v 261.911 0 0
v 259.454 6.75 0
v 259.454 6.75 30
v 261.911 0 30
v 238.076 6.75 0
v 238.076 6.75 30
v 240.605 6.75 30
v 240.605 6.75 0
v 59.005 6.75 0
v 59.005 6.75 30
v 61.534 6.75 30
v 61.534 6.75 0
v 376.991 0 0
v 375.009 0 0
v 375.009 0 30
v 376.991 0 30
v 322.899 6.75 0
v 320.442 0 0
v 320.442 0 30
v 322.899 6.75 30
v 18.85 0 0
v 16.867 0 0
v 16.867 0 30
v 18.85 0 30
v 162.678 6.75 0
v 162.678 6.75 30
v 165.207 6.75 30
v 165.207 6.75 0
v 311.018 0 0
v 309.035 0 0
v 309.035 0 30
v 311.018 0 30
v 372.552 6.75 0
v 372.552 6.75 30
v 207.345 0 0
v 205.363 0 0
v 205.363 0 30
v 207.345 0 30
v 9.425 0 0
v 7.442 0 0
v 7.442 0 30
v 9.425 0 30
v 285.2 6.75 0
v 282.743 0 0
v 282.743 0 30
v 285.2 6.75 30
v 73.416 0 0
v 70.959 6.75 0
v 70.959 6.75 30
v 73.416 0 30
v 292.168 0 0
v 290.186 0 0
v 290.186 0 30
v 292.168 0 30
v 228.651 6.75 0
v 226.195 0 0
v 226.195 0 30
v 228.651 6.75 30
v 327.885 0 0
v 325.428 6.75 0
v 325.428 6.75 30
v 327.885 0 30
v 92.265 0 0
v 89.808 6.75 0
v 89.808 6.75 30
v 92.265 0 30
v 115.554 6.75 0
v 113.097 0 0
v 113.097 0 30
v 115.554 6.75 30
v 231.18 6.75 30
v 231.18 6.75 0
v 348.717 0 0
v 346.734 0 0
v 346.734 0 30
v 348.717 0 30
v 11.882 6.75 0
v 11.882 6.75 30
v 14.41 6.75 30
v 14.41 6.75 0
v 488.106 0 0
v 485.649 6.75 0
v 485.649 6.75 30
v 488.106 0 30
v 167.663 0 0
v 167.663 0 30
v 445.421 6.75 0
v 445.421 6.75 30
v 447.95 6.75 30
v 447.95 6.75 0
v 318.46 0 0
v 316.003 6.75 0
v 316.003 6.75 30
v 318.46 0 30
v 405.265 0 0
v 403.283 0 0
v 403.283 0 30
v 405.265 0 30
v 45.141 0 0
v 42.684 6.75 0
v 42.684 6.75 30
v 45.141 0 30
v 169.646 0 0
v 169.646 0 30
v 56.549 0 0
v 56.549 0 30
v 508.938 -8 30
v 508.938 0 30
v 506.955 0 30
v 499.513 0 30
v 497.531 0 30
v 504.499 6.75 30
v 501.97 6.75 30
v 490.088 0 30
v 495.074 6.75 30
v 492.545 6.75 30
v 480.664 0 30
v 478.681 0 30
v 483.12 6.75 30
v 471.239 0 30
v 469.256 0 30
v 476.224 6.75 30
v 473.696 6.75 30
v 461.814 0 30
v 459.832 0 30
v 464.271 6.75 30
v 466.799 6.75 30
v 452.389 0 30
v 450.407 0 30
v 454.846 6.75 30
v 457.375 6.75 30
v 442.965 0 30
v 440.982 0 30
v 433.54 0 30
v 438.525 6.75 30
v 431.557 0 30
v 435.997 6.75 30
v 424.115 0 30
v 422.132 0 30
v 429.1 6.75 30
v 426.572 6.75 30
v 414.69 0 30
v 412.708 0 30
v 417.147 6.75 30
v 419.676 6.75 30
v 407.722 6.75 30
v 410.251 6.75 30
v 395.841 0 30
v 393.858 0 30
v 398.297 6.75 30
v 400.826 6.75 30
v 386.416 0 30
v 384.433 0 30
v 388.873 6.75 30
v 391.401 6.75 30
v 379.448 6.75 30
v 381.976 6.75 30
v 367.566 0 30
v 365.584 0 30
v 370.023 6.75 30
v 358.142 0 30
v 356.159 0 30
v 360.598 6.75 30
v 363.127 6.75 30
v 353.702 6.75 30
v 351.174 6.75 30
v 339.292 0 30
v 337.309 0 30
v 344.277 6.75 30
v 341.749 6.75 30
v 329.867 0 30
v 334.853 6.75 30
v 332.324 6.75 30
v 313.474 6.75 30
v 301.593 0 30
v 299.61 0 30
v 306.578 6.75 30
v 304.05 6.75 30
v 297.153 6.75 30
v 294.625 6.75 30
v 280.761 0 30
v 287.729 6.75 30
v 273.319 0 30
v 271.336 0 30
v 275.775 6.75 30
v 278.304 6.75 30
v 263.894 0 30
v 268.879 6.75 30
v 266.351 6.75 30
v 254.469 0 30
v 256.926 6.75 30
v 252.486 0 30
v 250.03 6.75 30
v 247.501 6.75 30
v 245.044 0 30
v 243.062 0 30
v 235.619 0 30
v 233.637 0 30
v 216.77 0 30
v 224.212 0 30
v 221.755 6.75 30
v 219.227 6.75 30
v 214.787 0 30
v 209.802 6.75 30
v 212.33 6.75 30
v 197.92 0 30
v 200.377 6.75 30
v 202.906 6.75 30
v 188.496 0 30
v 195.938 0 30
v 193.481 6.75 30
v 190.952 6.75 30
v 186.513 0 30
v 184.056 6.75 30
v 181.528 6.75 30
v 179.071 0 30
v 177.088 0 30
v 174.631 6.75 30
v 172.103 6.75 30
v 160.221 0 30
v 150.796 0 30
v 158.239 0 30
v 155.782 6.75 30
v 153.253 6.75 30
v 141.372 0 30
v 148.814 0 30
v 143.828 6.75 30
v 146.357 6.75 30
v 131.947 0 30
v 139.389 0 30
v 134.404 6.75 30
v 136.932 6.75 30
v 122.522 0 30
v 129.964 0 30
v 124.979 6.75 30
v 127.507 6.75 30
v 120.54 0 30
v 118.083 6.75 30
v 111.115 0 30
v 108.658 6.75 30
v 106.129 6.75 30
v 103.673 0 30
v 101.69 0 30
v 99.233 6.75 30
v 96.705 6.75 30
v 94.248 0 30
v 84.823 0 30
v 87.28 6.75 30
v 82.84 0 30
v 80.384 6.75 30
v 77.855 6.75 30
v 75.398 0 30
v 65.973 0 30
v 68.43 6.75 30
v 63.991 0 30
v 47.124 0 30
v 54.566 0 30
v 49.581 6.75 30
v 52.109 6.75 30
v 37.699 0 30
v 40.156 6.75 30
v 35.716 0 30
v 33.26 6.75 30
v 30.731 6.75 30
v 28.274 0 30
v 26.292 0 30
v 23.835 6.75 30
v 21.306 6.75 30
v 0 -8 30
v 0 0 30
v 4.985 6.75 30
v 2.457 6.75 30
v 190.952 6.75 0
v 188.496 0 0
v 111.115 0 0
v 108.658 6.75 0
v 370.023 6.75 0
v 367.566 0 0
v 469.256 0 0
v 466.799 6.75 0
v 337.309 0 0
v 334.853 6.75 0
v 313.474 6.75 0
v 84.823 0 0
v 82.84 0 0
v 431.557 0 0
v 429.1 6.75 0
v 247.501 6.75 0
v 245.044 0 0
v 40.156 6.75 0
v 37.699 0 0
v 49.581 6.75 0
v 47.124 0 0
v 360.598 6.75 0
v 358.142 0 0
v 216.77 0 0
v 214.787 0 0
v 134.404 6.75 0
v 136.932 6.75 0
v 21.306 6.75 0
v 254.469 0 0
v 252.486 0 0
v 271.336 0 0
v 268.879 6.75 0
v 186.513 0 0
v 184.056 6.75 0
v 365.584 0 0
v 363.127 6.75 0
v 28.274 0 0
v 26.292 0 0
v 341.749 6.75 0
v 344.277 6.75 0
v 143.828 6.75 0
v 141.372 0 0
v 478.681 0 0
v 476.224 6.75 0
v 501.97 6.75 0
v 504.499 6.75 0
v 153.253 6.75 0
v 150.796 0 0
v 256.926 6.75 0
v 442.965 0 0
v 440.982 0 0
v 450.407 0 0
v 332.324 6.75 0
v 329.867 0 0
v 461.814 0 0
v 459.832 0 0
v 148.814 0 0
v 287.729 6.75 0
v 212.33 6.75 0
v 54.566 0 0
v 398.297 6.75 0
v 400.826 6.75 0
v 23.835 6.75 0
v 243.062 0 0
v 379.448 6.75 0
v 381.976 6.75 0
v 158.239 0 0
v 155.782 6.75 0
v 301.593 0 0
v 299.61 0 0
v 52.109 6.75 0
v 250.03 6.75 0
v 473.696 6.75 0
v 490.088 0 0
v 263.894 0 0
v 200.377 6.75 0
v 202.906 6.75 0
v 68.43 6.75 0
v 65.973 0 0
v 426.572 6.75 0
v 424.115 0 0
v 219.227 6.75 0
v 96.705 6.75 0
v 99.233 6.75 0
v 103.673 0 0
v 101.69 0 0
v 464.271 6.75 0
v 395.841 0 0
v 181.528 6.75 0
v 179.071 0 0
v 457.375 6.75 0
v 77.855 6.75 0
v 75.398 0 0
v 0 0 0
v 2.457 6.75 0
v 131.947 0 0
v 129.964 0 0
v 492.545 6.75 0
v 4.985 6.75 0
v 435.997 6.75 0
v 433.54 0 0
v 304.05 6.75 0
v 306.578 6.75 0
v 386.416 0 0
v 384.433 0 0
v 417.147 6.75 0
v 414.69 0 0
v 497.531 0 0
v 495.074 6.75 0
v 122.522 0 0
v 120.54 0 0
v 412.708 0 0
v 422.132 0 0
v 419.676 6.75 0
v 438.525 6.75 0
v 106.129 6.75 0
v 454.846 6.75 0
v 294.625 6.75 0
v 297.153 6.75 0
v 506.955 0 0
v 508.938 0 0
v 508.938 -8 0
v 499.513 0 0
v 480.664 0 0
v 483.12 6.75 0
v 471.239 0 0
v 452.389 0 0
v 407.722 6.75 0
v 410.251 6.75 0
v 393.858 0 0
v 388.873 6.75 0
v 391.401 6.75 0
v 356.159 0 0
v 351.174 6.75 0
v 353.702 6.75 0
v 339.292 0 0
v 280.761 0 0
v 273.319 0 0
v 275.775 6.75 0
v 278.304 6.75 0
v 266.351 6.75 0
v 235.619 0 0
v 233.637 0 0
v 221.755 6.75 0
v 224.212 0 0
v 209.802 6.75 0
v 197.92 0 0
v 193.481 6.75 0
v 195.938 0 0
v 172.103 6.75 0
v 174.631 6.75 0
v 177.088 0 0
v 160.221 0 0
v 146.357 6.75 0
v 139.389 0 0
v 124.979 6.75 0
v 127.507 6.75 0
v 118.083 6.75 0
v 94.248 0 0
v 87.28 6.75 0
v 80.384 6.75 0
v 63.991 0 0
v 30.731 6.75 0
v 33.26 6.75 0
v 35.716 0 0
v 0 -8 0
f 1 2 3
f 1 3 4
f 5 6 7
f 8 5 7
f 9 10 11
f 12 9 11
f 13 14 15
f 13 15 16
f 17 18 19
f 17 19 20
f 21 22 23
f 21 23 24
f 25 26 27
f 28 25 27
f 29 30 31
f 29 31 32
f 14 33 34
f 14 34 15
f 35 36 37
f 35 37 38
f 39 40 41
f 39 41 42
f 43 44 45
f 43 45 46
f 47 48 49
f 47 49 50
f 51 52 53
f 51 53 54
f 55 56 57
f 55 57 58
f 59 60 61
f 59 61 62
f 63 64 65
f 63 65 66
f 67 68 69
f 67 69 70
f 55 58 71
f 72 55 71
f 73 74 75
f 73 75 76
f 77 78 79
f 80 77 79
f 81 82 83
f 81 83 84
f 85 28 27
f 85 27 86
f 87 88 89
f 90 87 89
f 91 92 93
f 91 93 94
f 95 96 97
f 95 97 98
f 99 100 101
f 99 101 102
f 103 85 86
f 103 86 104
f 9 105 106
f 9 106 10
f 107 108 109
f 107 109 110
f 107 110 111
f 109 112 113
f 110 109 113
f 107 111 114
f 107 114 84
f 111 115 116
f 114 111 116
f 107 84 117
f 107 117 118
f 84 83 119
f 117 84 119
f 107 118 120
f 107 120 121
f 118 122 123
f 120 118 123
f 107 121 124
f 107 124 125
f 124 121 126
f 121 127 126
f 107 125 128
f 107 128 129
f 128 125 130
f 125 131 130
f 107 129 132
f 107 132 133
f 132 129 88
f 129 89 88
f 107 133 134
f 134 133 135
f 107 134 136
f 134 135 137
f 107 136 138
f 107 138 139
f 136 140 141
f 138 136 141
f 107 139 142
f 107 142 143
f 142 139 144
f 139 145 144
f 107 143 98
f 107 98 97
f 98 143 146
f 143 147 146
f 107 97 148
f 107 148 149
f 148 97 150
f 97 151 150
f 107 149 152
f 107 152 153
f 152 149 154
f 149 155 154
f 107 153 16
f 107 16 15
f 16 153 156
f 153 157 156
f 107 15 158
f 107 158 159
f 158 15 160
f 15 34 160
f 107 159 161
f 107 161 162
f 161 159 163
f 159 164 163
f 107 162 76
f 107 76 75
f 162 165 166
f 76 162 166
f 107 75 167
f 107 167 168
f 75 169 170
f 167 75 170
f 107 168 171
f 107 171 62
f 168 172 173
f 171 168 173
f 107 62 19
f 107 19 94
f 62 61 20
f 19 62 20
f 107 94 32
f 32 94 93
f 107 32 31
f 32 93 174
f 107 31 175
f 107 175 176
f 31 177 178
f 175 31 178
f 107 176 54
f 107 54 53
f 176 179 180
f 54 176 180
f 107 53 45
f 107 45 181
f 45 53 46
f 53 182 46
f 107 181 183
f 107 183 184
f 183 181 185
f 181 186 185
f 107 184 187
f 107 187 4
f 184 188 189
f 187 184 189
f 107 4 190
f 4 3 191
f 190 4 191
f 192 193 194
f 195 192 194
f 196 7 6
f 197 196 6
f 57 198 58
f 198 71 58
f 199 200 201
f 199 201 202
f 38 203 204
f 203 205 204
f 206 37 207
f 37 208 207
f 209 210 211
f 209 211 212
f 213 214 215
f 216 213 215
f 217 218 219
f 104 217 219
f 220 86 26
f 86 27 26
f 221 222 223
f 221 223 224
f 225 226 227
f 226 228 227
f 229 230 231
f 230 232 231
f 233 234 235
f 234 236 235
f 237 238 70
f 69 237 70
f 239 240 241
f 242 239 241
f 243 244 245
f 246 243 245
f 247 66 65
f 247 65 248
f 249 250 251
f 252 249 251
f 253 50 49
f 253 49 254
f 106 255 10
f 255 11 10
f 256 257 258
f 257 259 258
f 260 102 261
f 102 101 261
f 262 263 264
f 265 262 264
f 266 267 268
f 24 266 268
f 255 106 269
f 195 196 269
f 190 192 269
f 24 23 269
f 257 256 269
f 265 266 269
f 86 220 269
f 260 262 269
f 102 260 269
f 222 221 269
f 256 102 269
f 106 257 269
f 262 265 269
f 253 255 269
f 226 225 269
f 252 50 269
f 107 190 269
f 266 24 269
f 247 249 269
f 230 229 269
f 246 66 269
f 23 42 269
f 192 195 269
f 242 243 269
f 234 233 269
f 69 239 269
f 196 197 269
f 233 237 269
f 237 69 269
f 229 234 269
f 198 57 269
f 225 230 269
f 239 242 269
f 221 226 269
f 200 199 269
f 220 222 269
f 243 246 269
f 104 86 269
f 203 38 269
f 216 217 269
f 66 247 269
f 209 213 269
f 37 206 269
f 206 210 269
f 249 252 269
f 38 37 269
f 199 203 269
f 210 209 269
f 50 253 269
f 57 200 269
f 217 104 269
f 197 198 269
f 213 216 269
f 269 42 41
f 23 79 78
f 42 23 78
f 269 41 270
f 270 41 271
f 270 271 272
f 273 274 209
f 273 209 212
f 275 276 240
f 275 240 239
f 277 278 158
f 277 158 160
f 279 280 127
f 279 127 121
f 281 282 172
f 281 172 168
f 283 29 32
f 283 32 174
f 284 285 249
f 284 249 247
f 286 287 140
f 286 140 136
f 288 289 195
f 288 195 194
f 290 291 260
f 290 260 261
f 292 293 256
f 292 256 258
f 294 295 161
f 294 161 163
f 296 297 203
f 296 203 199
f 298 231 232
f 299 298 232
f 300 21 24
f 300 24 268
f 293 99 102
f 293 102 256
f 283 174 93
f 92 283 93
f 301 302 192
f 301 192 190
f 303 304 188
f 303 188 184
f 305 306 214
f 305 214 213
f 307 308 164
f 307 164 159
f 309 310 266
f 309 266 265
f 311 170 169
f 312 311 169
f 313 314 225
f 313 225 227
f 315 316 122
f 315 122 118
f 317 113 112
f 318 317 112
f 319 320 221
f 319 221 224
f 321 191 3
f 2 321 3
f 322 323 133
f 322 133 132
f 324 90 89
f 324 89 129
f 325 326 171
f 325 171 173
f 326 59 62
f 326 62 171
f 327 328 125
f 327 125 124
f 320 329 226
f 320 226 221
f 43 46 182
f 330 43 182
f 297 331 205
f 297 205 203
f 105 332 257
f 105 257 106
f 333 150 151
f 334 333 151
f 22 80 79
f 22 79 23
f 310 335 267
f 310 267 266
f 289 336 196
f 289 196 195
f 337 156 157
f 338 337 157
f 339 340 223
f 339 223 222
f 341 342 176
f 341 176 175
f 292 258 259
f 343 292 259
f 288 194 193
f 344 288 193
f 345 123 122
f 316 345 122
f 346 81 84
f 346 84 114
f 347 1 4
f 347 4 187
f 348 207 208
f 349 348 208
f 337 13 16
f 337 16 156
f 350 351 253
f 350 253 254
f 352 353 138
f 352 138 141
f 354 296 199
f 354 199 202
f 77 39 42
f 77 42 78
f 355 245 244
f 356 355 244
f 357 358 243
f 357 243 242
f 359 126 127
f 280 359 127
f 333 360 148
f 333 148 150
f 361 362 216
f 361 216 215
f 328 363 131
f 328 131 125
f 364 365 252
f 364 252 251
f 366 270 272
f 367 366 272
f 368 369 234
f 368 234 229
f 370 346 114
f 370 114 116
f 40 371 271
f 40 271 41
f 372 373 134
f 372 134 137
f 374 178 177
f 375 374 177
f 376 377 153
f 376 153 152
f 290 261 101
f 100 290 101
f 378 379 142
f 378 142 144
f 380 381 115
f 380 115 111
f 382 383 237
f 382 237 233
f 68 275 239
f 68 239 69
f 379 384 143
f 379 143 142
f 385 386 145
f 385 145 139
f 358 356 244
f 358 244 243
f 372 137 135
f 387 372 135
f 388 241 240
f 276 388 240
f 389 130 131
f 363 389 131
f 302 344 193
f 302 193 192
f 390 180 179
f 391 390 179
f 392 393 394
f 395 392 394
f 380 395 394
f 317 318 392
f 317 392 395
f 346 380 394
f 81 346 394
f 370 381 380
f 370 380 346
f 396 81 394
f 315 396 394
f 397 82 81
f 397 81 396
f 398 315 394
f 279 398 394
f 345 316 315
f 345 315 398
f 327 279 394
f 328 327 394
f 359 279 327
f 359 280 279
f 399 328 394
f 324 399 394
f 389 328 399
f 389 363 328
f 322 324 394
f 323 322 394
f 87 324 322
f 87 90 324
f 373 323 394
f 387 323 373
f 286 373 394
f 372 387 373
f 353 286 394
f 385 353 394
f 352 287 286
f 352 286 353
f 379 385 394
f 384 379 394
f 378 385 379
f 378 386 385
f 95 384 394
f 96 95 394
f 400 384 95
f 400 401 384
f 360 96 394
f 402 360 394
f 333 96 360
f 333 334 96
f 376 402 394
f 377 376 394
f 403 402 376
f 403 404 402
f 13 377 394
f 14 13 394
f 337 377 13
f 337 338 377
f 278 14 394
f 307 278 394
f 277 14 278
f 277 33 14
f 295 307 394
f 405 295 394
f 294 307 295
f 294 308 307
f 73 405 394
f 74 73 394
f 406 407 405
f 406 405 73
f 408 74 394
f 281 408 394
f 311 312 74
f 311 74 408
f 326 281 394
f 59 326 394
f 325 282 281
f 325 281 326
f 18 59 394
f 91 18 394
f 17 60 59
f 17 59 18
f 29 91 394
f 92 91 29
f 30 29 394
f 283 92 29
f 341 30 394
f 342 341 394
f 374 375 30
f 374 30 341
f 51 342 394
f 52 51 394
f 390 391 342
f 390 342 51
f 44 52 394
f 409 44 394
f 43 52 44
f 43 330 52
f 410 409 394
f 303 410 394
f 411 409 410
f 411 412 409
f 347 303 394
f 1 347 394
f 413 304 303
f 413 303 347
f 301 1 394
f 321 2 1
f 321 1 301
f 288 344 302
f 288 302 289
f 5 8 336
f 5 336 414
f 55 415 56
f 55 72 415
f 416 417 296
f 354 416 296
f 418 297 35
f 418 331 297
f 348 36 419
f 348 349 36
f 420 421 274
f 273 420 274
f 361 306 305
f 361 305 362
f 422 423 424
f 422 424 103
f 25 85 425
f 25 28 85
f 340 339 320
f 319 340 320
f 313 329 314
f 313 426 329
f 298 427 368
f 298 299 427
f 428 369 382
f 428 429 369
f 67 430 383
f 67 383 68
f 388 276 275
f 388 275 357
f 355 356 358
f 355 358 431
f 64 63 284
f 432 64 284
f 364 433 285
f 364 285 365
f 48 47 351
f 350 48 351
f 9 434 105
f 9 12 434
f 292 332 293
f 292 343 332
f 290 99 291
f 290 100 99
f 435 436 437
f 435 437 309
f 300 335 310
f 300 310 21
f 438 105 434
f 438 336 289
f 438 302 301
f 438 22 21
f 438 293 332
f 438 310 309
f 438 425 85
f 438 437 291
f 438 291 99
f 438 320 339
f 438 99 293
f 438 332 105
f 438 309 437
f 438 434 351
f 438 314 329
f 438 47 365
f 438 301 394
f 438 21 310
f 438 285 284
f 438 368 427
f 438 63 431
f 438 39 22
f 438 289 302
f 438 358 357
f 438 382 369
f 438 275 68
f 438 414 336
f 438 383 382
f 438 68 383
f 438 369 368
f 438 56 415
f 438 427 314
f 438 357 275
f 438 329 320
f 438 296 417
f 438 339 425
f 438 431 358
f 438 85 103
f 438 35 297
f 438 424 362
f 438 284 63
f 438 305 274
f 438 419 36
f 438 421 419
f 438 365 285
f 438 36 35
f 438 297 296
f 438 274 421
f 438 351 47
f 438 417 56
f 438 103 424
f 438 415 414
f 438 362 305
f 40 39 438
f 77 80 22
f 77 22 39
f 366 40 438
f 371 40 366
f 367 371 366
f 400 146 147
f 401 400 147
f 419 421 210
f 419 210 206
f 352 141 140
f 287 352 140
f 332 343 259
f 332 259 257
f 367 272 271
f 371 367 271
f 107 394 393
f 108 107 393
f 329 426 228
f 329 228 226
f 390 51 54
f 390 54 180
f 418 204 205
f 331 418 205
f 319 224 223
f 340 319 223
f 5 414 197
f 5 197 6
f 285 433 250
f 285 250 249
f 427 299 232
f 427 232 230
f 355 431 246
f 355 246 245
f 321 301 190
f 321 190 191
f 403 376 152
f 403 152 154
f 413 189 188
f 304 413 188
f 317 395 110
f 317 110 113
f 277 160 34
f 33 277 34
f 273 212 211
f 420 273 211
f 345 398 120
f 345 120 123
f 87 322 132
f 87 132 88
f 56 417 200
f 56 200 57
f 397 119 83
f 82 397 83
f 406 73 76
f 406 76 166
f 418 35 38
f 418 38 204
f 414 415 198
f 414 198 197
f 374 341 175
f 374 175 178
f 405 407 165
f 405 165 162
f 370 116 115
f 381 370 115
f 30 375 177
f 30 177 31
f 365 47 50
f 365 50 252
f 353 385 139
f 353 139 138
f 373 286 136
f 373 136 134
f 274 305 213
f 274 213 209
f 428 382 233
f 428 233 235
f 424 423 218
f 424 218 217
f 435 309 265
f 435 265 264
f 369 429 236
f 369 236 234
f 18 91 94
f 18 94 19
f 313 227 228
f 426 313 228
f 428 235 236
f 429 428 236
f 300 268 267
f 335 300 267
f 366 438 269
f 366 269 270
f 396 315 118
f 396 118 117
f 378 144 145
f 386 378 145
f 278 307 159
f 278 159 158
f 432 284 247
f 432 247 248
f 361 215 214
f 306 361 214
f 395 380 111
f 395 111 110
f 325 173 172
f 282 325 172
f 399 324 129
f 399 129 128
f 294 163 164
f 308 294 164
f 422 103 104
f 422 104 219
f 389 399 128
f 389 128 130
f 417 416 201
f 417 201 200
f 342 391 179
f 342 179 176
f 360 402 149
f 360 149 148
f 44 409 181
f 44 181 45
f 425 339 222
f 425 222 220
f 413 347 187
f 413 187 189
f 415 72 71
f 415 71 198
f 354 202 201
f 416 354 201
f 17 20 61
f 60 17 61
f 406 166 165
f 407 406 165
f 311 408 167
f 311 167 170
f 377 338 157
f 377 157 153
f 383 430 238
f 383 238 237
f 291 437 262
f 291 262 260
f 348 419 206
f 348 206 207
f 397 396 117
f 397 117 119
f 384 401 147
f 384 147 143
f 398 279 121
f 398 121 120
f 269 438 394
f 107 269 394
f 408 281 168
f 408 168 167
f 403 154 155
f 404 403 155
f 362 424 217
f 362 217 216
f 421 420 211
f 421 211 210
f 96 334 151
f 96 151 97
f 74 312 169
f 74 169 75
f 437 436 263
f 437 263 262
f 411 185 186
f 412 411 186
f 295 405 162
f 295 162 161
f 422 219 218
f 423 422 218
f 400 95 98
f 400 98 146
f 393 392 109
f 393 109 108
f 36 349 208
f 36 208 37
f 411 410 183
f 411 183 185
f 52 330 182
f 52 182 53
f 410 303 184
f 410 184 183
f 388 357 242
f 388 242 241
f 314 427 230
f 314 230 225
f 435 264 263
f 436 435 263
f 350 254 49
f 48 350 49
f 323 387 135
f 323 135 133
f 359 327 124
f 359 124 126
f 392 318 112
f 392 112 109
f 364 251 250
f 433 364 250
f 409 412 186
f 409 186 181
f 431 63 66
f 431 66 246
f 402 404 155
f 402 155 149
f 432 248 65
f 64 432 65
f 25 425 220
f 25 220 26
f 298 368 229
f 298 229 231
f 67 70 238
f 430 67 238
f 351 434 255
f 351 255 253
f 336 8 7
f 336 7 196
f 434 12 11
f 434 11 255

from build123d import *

# Parameters (mm, degrees)
SKETCH_1_W             = 508.938009882
SKETCH_1_H             = 8
EXTRUDE_1_DEPTH        = 30
EXTRUDE_2_DEPTH        = 30
PATTERN_LINEAR_1_COUNT = 54
PATTERN_LINEAR_1_PITCH = 9.424777961


with BuildPart() as part:
    # 草图1 → 拉伸1 (new body)
    with BuildSketch(Plane.XY):
        with Locations((254.469004941, -4)):
            Rectangle(SKETCH_1_W, SKETCH_1_H)
    extrude(amount=EXTRUDE_1_DEPTH)

    # 草图2 → 拉伸2 (add)
    with BuildSketch(Plane.XY.offset(30)):
        Polygon((0, 0), (2.456799081, 6.75), (4.985366656, 6.75), (7.442165737, 0), align=None)
    extrude_2 = extrude(amount=-EXTRUDE_2_DEPTH)

    # 阵列(线性)1: 拉伸2 ×54
    with Locations(*[(i * PATTERN_LINEAR_1_PITCH, 0, 0) for i in range(1, PATTERN_LINEAR_1_COUNT)]):
        add(extrude_2)


solid = part.part
